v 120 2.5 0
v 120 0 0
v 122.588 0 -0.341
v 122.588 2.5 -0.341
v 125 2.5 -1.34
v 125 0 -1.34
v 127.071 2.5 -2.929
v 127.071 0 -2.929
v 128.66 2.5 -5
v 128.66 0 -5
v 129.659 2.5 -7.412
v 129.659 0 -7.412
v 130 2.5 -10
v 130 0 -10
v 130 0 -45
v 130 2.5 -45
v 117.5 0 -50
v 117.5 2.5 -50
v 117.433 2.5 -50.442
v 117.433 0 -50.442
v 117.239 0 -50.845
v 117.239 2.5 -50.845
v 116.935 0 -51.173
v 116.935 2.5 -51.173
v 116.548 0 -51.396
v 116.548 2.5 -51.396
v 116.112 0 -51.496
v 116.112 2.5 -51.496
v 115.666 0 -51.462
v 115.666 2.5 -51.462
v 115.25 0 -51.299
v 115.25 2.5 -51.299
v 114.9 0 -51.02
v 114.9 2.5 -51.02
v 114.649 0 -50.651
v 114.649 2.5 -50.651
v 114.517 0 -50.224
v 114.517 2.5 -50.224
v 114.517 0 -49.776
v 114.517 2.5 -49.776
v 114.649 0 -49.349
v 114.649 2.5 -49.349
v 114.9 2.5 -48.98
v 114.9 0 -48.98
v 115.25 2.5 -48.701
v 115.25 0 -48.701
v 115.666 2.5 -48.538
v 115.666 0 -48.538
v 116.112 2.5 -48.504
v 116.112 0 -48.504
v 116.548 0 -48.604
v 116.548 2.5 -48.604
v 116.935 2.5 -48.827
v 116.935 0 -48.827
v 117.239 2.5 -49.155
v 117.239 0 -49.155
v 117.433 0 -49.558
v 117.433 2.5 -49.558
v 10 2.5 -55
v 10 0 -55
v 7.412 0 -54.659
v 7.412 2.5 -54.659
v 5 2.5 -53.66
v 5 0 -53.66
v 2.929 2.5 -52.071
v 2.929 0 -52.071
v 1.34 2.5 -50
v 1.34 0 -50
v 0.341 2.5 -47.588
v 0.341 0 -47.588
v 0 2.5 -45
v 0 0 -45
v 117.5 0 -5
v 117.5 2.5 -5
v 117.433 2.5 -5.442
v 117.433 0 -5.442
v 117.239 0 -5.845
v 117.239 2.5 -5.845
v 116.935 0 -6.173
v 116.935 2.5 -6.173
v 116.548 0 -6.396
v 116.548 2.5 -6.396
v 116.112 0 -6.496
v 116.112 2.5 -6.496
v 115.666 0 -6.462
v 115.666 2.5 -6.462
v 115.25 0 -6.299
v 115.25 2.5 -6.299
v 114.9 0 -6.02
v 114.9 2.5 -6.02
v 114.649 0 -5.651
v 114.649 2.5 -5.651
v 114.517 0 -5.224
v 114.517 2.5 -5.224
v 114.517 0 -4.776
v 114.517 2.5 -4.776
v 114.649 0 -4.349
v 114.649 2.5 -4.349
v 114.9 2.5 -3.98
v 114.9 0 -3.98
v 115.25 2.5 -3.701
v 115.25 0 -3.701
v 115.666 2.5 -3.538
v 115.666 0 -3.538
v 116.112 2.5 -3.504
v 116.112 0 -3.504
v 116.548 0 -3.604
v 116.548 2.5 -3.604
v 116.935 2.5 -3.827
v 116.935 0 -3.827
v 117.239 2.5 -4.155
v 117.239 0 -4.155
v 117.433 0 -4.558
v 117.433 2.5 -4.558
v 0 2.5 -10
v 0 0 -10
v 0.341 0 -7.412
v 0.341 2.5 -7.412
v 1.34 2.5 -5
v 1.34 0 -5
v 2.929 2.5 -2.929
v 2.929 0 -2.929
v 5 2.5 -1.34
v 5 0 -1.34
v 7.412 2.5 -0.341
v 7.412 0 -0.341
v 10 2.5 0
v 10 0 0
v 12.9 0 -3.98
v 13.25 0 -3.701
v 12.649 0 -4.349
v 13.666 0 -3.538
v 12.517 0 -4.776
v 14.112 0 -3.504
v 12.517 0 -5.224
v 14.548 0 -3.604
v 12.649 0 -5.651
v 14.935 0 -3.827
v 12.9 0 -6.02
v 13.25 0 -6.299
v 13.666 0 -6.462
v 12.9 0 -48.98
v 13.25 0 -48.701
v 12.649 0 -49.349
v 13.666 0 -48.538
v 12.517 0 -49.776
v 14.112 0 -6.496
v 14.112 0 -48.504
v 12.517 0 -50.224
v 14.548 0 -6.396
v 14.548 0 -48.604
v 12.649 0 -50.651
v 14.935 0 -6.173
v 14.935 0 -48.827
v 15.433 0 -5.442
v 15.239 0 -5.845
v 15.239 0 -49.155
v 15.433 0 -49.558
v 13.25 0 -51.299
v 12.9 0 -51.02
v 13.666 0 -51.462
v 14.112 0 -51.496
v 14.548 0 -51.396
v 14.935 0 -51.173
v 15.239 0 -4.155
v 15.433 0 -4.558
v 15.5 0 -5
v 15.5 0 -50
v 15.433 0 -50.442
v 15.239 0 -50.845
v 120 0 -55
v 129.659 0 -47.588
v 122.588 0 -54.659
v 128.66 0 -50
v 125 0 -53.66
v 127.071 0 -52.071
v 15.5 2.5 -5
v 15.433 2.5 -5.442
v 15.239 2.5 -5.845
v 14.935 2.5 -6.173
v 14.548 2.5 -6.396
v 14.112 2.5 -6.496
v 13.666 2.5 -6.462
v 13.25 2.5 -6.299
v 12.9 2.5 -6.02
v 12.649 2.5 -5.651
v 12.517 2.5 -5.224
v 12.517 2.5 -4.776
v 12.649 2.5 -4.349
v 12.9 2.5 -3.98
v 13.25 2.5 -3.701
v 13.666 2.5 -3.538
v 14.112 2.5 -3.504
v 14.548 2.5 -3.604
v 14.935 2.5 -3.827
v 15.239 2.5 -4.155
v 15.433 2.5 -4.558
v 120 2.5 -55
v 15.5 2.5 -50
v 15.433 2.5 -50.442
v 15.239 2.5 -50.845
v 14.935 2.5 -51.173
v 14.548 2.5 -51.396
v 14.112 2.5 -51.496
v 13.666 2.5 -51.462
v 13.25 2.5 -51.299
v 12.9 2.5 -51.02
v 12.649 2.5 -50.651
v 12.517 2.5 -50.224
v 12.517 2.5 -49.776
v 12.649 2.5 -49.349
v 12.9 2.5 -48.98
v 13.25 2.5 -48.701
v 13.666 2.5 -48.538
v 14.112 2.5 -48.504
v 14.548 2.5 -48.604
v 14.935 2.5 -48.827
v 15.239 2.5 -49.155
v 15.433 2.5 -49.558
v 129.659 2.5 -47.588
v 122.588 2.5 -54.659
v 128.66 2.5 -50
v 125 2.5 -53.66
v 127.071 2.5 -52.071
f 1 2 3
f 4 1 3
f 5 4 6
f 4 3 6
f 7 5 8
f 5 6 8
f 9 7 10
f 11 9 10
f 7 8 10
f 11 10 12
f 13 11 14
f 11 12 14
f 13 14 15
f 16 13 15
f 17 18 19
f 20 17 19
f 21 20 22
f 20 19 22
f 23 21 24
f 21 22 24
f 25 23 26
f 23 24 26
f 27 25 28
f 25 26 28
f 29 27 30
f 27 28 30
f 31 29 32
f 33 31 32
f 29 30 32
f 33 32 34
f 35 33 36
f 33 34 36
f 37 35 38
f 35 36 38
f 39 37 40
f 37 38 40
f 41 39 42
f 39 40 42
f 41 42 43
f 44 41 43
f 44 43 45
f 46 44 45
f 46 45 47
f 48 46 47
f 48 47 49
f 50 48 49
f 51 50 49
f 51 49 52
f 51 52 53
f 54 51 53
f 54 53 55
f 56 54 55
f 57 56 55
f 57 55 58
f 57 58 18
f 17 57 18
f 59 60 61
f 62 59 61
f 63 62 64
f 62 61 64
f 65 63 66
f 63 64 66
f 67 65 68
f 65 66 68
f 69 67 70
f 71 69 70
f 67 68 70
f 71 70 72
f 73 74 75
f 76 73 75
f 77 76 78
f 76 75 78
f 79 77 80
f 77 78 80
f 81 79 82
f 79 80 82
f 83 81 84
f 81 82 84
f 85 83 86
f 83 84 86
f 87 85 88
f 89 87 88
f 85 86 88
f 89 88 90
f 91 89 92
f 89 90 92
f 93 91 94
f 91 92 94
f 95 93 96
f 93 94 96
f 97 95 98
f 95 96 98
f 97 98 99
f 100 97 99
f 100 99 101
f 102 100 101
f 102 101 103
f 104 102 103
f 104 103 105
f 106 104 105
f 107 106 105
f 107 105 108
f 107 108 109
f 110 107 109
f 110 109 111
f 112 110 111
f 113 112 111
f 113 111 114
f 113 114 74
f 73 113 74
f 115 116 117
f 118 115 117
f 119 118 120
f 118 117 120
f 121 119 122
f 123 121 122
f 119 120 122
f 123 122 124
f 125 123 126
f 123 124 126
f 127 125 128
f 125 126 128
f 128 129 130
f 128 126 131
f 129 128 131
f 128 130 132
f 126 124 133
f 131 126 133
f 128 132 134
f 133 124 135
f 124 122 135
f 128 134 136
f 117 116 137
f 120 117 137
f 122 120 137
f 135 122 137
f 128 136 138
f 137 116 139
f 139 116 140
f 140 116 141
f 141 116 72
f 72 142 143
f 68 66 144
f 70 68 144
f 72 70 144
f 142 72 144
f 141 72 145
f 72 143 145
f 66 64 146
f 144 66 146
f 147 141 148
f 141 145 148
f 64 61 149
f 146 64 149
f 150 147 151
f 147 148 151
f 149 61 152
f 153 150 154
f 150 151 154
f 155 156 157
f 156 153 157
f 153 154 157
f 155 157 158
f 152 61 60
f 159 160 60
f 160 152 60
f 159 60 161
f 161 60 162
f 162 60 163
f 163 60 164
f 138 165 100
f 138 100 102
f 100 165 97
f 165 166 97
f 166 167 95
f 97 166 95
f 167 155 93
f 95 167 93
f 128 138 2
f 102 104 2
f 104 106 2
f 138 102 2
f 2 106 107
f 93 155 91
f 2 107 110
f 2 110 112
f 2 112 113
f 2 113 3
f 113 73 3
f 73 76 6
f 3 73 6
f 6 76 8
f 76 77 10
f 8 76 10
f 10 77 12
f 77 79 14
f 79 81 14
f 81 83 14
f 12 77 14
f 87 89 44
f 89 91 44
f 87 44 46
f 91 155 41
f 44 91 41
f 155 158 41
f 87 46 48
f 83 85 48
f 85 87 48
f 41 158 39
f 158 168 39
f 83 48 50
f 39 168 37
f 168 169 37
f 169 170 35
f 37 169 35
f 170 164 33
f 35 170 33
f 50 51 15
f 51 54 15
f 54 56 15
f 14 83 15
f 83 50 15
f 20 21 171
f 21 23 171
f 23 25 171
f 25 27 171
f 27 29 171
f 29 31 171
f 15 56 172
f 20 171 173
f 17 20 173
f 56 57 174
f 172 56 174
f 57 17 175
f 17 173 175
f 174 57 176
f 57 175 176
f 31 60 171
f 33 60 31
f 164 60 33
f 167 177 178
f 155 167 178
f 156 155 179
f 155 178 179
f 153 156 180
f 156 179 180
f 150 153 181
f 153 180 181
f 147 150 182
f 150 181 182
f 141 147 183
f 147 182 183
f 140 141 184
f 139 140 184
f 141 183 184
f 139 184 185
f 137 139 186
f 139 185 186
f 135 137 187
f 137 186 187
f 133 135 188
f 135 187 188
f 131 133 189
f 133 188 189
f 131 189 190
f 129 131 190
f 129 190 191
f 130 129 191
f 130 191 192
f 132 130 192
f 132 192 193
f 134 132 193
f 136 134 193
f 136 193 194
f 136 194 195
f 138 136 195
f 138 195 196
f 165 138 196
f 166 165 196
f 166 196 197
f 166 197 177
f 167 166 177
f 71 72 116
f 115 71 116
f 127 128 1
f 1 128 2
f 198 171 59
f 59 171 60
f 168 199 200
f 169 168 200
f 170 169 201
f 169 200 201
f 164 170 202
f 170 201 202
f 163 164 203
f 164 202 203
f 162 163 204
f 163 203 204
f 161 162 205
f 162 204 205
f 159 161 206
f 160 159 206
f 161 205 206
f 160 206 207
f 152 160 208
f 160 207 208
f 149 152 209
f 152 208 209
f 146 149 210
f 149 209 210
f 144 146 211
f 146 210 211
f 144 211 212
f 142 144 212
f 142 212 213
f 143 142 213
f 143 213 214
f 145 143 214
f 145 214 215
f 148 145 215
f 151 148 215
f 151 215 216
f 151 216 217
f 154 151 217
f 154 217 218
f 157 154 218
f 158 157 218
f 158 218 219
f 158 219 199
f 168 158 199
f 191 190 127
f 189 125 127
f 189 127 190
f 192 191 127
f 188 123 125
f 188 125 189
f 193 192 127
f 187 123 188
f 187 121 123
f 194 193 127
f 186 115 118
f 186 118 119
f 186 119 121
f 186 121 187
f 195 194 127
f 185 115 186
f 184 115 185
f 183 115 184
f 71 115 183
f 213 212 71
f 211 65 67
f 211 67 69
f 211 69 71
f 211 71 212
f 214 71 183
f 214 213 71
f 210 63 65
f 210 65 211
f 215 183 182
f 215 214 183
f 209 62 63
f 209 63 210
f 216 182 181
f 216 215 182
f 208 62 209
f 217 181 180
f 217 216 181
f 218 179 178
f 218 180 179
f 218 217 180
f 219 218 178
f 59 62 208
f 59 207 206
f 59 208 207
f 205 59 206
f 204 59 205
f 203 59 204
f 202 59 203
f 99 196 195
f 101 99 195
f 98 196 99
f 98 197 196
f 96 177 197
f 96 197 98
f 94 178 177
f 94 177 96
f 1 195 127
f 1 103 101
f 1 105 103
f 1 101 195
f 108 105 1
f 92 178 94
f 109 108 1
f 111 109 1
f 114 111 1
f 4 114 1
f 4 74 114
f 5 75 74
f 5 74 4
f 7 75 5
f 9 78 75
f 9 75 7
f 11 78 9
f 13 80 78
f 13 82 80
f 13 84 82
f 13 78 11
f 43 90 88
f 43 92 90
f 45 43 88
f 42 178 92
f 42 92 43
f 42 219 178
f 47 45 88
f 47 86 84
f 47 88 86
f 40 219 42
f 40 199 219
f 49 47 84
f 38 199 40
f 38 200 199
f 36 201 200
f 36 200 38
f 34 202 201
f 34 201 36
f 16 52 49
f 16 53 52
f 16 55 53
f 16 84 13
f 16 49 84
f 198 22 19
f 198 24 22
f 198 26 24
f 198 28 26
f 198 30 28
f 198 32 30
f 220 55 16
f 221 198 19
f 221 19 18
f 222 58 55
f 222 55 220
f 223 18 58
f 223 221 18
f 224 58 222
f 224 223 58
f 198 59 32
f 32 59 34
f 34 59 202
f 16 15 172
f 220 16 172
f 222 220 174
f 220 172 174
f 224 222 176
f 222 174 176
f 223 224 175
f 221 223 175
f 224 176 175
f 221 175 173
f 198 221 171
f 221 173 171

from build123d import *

# Parameters (mm, degrees)
BOSS_EXTRUDE1_DEPTH = 2.5
SKETCH2_R           = 1.5
CUT_EXTRUDE1_DEPTH  = 3.5


with BuildPart() as part:
    # Sketch1 → Boss-Extrude1 (new body)
    with BuildSketch(Plane(origin=(0, 0, 0), x_dir=(1, 0, 0), z_dir=(0, 1, 0))):
        with BuildLine():
            Line((10, 0), (120, 0))
            ThreePointArc((120, 0), (127.071067812, 2.928932188), (130, 10))
            Line((130, 10), (130, 45))
            ThreePointArc((130, 45), (127.071067812, 52.071067812), (120, 55))
            Line((120, 55), (10, 55))
            ThreePointArc((10, 55), (2.928932188, 52.071067812), (0, 45))
            Line((0, 45), (0, 10))
            ThreePointArc((0, 10), (2.928932188, 2.928932188), (10, 0))
        make_face()
    extrude(amount=BOSS_EXTRUDE1_DEPTH)

    # Sketch2 → Cut-Extrude1 (cut, through all)
    with BuildSketch(Plane(origin=(0, 2.5, 0), x_dir=(1, 0, 0), z_dir=(0, 1, 0))):
        with Locations((14, 5)):
            Circle(SKETCH2_R)
        with Locations((14, 50)):
            Circle(SKETCH2_R)
        with Locations((116, 5)):
            Circle(SKETCH2_R)
        with Locations((116, 50)):
            Circle(SKETCH2_R)
    extrude(amount=-CUT_EXTRUDE1_DEPTH, mode=Mode.SUBTRACT)


solid = part.part
